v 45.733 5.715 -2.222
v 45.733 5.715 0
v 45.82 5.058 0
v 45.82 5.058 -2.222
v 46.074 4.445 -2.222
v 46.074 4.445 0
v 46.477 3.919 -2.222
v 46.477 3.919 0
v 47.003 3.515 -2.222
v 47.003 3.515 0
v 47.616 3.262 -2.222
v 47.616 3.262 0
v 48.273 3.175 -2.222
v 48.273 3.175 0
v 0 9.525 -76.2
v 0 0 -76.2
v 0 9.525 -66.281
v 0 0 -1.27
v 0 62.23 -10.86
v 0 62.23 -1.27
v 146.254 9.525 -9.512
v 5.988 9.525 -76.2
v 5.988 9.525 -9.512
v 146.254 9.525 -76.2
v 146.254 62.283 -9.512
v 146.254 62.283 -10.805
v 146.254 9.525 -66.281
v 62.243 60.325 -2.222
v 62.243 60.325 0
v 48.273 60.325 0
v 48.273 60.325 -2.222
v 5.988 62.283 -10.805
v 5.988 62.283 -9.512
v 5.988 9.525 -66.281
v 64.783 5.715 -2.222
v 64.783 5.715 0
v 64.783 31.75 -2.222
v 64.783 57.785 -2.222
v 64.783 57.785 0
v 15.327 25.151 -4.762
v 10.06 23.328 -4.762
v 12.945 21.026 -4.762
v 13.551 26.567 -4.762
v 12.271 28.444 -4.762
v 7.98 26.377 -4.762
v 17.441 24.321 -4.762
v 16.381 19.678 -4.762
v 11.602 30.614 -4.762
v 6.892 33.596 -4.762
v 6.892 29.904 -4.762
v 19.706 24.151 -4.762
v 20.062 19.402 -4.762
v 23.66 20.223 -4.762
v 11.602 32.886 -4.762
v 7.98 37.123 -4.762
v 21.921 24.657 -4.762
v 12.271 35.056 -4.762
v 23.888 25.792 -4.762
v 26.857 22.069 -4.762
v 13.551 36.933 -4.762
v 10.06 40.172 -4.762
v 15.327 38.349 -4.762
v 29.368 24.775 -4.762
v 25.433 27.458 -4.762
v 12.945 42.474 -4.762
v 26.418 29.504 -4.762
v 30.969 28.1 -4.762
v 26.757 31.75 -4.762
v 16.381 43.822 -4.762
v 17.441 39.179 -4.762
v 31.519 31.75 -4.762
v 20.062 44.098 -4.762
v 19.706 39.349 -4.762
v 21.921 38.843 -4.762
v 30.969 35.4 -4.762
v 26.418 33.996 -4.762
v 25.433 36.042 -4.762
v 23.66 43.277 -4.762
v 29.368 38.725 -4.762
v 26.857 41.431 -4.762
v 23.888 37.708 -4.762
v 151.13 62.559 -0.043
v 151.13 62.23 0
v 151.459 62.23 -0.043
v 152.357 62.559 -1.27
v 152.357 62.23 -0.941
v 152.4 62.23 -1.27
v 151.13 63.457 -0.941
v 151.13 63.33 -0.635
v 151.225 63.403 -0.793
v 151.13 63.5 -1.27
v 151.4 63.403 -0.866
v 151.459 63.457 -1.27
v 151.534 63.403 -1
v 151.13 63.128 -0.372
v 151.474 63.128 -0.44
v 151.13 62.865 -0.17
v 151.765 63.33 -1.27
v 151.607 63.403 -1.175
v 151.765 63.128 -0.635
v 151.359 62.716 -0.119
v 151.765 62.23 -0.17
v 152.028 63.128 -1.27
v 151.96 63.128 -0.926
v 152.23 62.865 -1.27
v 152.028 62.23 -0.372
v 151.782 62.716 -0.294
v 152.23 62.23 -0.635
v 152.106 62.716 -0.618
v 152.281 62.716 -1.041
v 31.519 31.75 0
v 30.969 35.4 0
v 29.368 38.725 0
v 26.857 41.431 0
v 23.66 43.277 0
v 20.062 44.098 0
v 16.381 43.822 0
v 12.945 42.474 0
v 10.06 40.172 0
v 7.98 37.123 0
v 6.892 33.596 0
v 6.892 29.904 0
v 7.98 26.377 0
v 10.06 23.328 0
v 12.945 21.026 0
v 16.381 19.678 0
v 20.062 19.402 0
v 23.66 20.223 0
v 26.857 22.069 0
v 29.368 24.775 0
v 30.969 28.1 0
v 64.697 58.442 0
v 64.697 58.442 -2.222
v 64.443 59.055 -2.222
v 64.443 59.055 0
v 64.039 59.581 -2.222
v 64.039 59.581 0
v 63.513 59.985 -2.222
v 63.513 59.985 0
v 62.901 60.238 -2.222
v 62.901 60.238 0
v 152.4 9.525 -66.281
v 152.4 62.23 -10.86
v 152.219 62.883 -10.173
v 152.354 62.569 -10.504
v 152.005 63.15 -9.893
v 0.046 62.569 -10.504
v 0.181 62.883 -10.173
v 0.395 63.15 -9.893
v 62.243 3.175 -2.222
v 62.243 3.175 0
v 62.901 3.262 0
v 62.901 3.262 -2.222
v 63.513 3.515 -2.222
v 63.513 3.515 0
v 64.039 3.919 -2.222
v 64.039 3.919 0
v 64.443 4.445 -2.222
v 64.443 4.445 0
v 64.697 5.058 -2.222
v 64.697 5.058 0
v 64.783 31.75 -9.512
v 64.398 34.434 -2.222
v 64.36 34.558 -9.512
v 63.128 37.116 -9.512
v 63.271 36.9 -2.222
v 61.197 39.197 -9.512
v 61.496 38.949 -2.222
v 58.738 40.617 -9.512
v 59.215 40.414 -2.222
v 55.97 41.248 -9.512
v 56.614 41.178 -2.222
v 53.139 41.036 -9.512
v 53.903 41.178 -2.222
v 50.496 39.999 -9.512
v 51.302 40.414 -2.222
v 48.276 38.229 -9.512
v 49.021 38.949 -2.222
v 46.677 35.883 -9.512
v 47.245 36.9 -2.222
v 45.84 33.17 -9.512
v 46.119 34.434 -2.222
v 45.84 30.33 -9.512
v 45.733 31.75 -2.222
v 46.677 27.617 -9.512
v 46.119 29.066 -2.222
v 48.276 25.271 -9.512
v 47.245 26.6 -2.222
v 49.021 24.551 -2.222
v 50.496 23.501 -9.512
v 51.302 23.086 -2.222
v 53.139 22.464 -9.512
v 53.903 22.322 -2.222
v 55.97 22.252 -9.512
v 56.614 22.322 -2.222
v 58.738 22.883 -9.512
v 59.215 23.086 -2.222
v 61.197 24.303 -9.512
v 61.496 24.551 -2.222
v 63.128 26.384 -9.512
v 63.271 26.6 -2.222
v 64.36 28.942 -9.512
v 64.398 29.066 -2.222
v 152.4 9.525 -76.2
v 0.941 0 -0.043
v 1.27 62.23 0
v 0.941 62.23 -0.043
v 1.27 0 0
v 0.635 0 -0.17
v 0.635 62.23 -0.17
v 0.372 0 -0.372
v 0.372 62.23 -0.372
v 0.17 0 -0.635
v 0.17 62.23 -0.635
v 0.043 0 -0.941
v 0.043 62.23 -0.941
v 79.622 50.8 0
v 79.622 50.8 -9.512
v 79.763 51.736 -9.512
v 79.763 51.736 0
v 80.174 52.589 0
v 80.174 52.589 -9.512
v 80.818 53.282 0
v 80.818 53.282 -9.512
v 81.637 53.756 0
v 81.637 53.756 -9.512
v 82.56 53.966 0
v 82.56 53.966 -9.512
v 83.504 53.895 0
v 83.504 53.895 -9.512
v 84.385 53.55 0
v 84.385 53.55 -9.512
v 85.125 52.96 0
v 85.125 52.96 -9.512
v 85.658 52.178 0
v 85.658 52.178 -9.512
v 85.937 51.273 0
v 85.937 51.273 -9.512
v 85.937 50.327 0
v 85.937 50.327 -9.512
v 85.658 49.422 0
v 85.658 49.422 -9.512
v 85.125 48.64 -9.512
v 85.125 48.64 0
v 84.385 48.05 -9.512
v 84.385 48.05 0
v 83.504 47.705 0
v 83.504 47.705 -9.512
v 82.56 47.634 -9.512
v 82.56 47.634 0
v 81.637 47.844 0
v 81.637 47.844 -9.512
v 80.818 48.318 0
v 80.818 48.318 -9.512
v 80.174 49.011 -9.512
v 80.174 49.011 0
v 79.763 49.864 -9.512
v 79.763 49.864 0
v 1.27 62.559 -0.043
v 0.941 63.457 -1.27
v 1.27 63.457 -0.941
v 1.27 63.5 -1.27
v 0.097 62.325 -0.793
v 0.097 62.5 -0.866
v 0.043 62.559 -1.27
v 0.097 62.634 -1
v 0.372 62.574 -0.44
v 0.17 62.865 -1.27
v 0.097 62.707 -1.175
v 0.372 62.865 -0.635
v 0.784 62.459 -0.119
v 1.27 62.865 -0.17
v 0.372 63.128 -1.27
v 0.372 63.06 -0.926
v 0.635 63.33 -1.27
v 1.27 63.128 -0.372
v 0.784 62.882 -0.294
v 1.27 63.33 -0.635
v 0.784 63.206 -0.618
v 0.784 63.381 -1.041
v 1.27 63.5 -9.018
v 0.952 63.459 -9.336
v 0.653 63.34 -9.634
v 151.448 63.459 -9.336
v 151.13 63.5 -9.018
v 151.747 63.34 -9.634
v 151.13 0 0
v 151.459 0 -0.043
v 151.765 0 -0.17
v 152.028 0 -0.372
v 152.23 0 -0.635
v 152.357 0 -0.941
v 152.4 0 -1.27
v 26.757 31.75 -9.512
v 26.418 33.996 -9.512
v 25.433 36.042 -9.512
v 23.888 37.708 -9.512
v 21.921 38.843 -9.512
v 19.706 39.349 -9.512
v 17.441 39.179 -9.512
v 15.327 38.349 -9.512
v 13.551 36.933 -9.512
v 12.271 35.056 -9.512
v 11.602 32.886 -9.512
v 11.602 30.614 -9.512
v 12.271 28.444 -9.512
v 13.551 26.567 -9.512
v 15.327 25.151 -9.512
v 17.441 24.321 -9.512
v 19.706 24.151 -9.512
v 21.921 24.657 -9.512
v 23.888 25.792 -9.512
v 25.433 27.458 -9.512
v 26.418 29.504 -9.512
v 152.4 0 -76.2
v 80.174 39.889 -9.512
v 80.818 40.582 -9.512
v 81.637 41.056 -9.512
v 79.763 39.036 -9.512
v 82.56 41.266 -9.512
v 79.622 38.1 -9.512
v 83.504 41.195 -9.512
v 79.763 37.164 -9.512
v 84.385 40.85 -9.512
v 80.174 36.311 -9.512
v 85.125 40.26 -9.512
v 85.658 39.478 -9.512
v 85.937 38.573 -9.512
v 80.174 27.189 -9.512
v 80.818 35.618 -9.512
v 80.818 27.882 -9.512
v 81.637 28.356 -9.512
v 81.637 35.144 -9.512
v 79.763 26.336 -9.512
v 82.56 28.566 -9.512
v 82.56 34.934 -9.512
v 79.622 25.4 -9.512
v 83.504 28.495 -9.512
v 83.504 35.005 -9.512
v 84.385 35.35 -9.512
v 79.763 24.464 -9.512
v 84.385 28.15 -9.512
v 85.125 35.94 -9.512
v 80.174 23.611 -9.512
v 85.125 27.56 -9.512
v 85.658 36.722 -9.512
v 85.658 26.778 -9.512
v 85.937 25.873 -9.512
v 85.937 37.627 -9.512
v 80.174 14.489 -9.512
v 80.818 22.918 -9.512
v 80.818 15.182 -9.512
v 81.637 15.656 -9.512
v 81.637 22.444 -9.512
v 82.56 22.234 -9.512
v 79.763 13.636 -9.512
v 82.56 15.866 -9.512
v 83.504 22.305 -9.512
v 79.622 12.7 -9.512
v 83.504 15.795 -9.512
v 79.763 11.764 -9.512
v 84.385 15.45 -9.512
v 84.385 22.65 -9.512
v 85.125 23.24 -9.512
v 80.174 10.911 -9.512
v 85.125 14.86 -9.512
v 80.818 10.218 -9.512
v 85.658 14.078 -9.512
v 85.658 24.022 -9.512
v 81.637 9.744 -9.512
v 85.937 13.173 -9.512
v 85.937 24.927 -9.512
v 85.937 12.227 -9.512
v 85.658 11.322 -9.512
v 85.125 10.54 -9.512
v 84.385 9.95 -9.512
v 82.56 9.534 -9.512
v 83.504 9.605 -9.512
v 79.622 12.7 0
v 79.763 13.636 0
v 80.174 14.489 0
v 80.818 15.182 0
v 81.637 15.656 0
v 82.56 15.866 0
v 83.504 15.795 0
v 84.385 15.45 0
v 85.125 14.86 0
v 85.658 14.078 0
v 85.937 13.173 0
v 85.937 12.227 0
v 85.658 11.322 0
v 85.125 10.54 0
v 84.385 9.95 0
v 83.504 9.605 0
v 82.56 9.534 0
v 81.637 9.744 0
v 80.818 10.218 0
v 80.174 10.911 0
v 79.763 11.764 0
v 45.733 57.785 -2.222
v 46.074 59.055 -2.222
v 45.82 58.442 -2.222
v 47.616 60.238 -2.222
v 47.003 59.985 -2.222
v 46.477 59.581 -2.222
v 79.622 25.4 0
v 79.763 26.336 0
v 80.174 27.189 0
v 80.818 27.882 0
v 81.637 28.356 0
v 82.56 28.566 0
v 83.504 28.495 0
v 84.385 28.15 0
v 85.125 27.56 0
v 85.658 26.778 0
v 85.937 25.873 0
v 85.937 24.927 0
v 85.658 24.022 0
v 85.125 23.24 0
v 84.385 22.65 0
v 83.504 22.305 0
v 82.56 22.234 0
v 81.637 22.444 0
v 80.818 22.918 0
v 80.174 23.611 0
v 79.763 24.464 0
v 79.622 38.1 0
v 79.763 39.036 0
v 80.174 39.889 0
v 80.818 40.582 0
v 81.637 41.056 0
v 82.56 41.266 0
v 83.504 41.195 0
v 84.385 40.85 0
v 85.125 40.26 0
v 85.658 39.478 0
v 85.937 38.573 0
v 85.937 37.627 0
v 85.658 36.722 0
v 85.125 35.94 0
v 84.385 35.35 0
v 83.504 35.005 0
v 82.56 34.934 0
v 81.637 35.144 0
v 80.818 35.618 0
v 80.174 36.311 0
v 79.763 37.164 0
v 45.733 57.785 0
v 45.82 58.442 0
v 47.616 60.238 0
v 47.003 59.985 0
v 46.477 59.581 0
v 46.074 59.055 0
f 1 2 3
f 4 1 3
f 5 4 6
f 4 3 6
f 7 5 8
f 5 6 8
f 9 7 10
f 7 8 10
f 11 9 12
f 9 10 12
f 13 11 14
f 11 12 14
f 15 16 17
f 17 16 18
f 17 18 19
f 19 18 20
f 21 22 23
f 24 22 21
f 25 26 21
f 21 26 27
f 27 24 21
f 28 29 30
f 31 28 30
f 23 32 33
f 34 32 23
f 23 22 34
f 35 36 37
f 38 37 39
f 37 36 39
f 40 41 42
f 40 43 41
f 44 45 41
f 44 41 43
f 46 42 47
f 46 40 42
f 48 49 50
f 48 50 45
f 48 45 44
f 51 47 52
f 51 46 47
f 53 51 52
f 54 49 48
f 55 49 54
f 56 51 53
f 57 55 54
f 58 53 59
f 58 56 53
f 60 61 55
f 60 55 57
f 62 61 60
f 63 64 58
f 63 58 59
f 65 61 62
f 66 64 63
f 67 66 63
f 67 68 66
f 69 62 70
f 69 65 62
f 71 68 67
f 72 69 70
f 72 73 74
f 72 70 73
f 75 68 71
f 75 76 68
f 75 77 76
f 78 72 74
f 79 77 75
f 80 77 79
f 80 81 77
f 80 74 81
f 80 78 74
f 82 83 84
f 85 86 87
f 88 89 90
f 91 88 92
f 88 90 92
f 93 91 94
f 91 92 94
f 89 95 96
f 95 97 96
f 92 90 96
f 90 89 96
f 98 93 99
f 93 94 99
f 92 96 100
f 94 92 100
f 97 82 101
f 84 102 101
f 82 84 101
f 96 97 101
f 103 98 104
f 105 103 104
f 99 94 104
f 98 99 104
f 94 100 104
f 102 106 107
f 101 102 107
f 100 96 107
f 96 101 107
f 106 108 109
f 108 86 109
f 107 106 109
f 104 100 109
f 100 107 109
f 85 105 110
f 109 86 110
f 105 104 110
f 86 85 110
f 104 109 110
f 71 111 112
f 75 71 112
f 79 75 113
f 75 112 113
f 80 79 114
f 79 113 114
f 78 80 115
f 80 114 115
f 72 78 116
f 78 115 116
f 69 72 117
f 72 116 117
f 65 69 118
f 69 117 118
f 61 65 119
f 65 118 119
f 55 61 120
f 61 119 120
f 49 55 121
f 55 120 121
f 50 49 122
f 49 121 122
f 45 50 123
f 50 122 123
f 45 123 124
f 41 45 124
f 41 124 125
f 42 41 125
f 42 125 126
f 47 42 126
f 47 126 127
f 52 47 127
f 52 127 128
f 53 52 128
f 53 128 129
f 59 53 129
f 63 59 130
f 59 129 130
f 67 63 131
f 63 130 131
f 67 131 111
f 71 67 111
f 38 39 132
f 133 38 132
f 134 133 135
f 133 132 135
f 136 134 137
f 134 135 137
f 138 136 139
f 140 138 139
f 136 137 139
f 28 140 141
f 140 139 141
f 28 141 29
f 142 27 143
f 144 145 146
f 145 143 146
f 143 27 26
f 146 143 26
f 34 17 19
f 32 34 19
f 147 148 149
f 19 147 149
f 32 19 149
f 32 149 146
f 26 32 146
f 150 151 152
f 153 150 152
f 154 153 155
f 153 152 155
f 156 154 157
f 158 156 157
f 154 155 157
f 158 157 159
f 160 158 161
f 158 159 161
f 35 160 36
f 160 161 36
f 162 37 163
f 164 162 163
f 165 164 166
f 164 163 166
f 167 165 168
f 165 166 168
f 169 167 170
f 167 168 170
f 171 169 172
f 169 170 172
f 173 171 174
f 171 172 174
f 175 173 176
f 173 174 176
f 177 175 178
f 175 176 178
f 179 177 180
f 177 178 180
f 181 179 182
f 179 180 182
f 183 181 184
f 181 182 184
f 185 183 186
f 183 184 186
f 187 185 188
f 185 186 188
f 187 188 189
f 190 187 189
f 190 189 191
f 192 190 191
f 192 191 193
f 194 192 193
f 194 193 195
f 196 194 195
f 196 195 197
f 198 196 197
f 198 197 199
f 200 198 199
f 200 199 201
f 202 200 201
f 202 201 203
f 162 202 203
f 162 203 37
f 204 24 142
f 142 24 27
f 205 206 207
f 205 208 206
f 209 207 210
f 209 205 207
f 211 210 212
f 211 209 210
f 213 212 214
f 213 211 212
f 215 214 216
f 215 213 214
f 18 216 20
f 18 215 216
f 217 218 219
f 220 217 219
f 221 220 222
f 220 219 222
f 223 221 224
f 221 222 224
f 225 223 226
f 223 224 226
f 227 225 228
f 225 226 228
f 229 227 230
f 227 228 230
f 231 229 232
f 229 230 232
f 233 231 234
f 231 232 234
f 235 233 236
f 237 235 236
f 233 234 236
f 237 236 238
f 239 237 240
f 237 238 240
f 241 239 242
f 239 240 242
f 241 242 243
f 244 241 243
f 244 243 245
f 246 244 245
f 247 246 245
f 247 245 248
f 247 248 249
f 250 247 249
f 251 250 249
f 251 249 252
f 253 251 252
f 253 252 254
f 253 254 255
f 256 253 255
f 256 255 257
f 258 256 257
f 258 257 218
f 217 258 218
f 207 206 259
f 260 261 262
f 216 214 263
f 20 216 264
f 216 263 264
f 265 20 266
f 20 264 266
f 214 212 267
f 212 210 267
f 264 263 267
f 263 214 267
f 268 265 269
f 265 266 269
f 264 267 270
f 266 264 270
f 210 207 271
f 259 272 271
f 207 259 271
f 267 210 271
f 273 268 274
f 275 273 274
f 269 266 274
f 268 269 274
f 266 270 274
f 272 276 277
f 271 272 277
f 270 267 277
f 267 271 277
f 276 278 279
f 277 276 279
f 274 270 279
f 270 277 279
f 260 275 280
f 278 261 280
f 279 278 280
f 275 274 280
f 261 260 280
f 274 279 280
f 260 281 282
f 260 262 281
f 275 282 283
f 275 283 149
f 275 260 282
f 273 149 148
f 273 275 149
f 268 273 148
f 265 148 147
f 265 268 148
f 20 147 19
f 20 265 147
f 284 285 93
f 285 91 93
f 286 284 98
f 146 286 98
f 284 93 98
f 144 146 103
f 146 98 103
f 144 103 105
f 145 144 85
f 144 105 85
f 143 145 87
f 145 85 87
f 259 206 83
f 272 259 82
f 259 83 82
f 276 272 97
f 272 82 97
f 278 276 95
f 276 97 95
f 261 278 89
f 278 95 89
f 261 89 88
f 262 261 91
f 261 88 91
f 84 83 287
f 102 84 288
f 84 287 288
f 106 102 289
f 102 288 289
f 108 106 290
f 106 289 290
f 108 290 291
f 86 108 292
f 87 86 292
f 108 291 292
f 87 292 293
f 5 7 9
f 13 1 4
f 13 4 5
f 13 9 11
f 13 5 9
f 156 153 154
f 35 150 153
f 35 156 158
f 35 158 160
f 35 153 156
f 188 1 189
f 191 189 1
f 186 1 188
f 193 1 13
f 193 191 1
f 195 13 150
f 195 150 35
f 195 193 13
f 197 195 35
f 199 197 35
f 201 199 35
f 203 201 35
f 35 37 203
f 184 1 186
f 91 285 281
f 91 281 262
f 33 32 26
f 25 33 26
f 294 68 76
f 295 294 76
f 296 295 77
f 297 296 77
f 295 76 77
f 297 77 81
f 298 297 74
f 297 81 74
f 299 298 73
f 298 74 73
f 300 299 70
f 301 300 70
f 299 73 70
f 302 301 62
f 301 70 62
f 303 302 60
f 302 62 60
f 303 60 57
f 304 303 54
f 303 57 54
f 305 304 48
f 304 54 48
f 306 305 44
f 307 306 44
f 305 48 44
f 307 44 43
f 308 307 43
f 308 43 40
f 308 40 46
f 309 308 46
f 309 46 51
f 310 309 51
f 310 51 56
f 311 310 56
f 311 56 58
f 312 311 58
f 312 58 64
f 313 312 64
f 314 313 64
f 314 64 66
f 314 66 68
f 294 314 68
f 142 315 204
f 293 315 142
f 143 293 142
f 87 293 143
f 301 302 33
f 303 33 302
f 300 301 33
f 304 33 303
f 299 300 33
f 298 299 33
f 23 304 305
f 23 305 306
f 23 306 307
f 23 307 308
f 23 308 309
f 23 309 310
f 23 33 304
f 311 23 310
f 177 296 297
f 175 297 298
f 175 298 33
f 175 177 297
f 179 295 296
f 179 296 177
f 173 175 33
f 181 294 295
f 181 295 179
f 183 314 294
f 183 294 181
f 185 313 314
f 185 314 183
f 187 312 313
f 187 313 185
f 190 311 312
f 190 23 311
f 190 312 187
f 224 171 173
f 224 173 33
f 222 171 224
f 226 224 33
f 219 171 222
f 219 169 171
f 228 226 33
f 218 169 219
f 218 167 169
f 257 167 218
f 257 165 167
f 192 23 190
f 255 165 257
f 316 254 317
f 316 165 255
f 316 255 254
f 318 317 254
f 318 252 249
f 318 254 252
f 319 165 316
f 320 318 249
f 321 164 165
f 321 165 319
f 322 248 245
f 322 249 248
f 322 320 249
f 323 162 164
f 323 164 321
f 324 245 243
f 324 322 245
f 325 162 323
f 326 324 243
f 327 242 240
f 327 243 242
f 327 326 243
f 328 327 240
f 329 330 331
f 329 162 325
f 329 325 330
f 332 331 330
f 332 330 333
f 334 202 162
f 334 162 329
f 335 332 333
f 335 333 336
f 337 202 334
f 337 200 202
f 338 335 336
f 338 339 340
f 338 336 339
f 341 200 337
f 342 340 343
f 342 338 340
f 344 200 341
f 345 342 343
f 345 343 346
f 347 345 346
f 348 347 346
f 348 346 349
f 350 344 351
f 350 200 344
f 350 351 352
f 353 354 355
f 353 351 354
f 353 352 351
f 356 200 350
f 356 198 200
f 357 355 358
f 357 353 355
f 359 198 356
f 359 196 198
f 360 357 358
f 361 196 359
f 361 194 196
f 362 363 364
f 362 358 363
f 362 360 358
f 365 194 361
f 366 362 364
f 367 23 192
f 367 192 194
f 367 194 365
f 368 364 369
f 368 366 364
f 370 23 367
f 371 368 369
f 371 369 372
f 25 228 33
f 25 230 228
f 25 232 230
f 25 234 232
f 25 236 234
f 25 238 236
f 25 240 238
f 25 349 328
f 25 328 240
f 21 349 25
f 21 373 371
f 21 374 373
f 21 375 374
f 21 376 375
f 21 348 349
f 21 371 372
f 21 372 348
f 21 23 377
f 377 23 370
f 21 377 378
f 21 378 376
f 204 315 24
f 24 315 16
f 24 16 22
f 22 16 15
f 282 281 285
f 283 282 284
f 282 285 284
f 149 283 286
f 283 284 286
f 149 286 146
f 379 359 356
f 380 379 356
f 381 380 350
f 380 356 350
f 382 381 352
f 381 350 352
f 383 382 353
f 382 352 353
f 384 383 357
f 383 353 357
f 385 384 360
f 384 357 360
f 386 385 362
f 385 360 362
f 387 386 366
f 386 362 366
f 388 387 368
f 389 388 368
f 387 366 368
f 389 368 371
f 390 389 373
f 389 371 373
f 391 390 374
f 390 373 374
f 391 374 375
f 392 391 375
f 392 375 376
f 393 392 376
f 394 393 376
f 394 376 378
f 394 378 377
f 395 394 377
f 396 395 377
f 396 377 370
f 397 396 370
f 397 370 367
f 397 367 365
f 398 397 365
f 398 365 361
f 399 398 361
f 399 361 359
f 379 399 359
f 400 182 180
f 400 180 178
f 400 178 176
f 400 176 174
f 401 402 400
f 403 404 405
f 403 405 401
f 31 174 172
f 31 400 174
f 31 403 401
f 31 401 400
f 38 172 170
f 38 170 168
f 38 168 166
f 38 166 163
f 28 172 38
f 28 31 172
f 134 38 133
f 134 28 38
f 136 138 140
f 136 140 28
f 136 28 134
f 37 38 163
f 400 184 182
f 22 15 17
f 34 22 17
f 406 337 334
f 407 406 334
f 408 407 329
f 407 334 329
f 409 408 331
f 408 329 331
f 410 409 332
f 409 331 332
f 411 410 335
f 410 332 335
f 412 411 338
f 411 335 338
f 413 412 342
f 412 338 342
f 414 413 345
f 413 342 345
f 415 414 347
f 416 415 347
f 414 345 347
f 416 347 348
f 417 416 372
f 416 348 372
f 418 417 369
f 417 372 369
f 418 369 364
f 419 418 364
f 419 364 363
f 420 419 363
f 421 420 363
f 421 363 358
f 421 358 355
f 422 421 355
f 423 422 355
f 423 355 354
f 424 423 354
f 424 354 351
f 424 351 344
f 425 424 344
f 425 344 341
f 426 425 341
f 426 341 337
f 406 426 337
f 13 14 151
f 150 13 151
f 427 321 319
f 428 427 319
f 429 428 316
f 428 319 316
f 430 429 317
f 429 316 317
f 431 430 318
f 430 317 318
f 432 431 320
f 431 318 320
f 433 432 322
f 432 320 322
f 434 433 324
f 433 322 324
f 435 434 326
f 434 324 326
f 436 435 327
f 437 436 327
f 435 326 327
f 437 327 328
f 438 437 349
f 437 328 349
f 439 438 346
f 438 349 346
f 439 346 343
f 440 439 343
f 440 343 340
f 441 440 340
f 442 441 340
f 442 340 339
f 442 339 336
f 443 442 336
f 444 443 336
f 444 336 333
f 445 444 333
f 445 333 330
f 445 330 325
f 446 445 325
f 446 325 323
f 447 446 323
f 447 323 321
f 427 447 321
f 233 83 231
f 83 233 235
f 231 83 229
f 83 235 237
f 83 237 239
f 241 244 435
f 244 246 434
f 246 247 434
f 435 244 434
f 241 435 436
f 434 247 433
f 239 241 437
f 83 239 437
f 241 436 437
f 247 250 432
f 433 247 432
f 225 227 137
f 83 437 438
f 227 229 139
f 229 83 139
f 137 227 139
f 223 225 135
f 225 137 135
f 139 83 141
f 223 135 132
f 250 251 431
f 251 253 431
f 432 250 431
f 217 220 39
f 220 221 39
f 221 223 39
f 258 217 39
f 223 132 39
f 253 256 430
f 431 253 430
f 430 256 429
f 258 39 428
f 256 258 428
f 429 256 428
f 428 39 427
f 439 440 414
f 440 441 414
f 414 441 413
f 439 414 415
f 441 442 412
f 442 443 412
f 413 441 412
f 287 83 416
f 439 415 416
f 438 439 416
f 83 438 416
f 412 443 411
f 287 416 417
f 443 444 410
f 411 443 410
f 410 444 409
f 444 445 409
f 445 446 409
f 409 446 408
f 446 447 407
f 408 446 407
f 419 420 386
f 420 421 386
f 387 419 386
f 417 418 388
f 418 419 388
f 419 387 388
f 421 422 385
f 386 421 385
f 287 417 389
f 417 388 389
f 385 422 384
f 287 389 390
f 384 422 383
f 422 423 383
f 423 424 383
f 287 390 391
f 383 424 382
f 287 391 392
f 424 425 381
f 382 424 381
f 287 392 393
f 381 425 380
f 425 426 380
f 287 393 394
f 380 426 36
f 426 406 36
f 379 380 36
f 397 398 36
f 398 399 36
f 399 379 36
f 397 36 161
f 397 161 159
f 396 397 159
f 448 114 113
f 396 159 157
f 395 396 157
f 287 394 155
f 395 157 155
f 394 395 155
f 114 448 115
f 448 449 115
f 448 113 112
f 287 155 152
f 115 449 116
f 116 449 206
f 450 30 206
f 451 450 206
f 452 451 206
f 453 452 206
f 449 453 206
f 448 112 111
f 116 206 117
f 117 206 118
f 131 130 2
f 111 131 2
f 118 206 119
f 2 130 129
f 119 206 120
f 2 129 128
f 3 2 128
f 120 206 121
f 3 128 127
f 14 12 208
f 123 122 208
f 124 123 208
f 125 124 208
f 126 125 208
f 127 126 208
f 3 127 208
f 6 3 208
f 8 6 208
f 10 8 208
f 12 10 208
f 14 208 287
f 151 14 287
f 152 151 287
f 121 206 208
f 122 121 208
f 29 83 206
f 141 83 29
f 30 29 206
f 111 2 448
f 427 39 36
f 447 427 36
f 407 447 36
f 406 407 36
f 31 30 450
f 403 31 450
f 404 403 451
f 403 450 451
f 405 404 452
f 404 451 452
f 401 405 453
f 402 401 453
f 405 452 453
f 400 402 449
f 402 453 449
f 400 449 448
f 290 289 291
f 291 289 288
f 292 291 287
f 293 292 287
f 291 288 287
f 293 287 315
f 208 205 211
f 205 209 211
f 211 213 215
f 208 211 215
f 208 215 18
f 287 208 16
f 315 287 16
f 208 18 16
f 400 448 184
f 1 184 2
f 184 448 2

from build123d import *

# Parameters (mm, degrees)
F1_DEPTH = 152.4
F2_W     = 140.266319
F2_H     = 52.757537
F3_DEPTH = 66.68789
F4_R     = 7.62
F5_DEPTH = 25.4
F4_R_2   = 12.3825
F6_DEPTH = 4.7625
F7_DEPTH = 25.4
F8_DEPTH = 2.2225
F9_DEPTH = 2.2225
F10_D    = 6.35
F11_R    = 1.27


with BuildPart() as f1:
    # F0 (on Right) → F1 (new body)
    with BuildSketch(Plane.YZ):
        Polygon((63.5, 0), (0, 0), (0, -76.2), (9.525, -76.2), (9.525, -66.280512), (63.5, -9.525), align=None)
    extrude(amount=F1_DEPTH)

    # F2 (on face) → F3 (cut)
    with BuildSketch(Plane(origin=(0, 0, -76.2), x_dir=(1, 0, 0), z_dir=(0, 0, -1))):
        with Locations((76.120947, -35.903768)):
            Rectangle(F2_W, F2_H)
    extrude(amount=-F3_DEPTH, mode=Mode.SUBTRACT)

    # F4 (on face) → F5 (cut)
    with BuildSketch(Plane.XY):
        with Locations((19.136649, 31.75)):
            Circle(F4_R)
    extrude(amount=-F5_DEPTH, mode=Mode.SUBTRACT)

    # F4 (on face) → F6 (cut)
    with BuildSketch(Plane.XY):
        with Locations((19.136649, 31.75)):
            Circle(F4_R_2)
        with Locations((19.136649, 31.75)):
            Circle(F4_R, mode=Mode.SUBTRACT)
    extrude(amount=-F6_DEPTH, mode=Mode.SUBTRACT)

    # F4 (on face) → F7 (cut)
    with BuildSketch(Plane.XY):
        with BuildLine():
            ThreePointArc((45.733401, 31.75), (55.258401, 22.225), (64.783401, 31.75))
            ThreePointArc((64.783401, 31.75), (55.258401, 41.275), (45.733401, 31.75))
        make_face()
    extrude(amount=-F7_DEPTH, mode=Mode.SUBTRACT)

    # F4 (on face) → F8 (cut)
    with BuildSketch(Plane.XY):
        with BuildLine():
            ThreePointArc((45.733401, 31.75), (55.258401, 41.275), (64.783401, 31.75))
            Line((64.783401, 31.75), (64.783401, 57.785))
            ThreePointArc((64.783401, 57.785), (64.039452, 59.581051), (62.243401, 60.325))
            Line((62.243401, 60.325), (48.273401, 60.325))
            ThreePointArc((48.273401, 60.325), (46.47735, 59.581051), (45.733401, 57.785))
            Line((45.733401, 57.785), (45.733401, 31.75))
        make_face()
    extrude(amount=-F8_DEPTH, mode=Mode.SUBTRACT)

    # F4 (on face) → F9 (cut)
    with BuildSketch(Plane.XY):
        with BuildLine():
            Line((64.783401, 5.715), (64.783401, 31.75))
            ThreePointArc((64.783401, 31.75), (55.258401, 22.225), (45.733401, 31.75))
            Line((45.733401, 31.75), (45.733401, 5.715))
            ThreePointArc((45.733401, 5.715), (46.47735, 3.918949), (48.273401, 3.175))
            Line((48.273401, 3.175), (62.243401, 3.175))
            ThreePointArc((62.243401, 3.175), (64.039452, 3.918949), (64.783401, 5.715))
        make_face()
    extrude(amount=-F9_DEPTH, mode=Mode.SUBTRACT)

    # F10 (through all)
    with Locations(Plane.XY):
        with Locations((82.797177, 50.8), (82.797177, 38.1), (82.797177, 25.4), (82.797177, 12.7)):
            Hole(F10_D / 2)

    # F11
    f11_edges = [f1.edges().sort_by_distance(p)[0] for p in [
        (152.4, 31.75, 0),
        (76.2, 63.5, 0),
        (0, 31.75, 0),
        (0, 63.5, -4.7625),
        (152.4, 63.5, -4.7625),
        (76.2, 63.5, -9.525),
    ]]
    fillet(f11_edges, radius=F11_R)


solid = f1.part
